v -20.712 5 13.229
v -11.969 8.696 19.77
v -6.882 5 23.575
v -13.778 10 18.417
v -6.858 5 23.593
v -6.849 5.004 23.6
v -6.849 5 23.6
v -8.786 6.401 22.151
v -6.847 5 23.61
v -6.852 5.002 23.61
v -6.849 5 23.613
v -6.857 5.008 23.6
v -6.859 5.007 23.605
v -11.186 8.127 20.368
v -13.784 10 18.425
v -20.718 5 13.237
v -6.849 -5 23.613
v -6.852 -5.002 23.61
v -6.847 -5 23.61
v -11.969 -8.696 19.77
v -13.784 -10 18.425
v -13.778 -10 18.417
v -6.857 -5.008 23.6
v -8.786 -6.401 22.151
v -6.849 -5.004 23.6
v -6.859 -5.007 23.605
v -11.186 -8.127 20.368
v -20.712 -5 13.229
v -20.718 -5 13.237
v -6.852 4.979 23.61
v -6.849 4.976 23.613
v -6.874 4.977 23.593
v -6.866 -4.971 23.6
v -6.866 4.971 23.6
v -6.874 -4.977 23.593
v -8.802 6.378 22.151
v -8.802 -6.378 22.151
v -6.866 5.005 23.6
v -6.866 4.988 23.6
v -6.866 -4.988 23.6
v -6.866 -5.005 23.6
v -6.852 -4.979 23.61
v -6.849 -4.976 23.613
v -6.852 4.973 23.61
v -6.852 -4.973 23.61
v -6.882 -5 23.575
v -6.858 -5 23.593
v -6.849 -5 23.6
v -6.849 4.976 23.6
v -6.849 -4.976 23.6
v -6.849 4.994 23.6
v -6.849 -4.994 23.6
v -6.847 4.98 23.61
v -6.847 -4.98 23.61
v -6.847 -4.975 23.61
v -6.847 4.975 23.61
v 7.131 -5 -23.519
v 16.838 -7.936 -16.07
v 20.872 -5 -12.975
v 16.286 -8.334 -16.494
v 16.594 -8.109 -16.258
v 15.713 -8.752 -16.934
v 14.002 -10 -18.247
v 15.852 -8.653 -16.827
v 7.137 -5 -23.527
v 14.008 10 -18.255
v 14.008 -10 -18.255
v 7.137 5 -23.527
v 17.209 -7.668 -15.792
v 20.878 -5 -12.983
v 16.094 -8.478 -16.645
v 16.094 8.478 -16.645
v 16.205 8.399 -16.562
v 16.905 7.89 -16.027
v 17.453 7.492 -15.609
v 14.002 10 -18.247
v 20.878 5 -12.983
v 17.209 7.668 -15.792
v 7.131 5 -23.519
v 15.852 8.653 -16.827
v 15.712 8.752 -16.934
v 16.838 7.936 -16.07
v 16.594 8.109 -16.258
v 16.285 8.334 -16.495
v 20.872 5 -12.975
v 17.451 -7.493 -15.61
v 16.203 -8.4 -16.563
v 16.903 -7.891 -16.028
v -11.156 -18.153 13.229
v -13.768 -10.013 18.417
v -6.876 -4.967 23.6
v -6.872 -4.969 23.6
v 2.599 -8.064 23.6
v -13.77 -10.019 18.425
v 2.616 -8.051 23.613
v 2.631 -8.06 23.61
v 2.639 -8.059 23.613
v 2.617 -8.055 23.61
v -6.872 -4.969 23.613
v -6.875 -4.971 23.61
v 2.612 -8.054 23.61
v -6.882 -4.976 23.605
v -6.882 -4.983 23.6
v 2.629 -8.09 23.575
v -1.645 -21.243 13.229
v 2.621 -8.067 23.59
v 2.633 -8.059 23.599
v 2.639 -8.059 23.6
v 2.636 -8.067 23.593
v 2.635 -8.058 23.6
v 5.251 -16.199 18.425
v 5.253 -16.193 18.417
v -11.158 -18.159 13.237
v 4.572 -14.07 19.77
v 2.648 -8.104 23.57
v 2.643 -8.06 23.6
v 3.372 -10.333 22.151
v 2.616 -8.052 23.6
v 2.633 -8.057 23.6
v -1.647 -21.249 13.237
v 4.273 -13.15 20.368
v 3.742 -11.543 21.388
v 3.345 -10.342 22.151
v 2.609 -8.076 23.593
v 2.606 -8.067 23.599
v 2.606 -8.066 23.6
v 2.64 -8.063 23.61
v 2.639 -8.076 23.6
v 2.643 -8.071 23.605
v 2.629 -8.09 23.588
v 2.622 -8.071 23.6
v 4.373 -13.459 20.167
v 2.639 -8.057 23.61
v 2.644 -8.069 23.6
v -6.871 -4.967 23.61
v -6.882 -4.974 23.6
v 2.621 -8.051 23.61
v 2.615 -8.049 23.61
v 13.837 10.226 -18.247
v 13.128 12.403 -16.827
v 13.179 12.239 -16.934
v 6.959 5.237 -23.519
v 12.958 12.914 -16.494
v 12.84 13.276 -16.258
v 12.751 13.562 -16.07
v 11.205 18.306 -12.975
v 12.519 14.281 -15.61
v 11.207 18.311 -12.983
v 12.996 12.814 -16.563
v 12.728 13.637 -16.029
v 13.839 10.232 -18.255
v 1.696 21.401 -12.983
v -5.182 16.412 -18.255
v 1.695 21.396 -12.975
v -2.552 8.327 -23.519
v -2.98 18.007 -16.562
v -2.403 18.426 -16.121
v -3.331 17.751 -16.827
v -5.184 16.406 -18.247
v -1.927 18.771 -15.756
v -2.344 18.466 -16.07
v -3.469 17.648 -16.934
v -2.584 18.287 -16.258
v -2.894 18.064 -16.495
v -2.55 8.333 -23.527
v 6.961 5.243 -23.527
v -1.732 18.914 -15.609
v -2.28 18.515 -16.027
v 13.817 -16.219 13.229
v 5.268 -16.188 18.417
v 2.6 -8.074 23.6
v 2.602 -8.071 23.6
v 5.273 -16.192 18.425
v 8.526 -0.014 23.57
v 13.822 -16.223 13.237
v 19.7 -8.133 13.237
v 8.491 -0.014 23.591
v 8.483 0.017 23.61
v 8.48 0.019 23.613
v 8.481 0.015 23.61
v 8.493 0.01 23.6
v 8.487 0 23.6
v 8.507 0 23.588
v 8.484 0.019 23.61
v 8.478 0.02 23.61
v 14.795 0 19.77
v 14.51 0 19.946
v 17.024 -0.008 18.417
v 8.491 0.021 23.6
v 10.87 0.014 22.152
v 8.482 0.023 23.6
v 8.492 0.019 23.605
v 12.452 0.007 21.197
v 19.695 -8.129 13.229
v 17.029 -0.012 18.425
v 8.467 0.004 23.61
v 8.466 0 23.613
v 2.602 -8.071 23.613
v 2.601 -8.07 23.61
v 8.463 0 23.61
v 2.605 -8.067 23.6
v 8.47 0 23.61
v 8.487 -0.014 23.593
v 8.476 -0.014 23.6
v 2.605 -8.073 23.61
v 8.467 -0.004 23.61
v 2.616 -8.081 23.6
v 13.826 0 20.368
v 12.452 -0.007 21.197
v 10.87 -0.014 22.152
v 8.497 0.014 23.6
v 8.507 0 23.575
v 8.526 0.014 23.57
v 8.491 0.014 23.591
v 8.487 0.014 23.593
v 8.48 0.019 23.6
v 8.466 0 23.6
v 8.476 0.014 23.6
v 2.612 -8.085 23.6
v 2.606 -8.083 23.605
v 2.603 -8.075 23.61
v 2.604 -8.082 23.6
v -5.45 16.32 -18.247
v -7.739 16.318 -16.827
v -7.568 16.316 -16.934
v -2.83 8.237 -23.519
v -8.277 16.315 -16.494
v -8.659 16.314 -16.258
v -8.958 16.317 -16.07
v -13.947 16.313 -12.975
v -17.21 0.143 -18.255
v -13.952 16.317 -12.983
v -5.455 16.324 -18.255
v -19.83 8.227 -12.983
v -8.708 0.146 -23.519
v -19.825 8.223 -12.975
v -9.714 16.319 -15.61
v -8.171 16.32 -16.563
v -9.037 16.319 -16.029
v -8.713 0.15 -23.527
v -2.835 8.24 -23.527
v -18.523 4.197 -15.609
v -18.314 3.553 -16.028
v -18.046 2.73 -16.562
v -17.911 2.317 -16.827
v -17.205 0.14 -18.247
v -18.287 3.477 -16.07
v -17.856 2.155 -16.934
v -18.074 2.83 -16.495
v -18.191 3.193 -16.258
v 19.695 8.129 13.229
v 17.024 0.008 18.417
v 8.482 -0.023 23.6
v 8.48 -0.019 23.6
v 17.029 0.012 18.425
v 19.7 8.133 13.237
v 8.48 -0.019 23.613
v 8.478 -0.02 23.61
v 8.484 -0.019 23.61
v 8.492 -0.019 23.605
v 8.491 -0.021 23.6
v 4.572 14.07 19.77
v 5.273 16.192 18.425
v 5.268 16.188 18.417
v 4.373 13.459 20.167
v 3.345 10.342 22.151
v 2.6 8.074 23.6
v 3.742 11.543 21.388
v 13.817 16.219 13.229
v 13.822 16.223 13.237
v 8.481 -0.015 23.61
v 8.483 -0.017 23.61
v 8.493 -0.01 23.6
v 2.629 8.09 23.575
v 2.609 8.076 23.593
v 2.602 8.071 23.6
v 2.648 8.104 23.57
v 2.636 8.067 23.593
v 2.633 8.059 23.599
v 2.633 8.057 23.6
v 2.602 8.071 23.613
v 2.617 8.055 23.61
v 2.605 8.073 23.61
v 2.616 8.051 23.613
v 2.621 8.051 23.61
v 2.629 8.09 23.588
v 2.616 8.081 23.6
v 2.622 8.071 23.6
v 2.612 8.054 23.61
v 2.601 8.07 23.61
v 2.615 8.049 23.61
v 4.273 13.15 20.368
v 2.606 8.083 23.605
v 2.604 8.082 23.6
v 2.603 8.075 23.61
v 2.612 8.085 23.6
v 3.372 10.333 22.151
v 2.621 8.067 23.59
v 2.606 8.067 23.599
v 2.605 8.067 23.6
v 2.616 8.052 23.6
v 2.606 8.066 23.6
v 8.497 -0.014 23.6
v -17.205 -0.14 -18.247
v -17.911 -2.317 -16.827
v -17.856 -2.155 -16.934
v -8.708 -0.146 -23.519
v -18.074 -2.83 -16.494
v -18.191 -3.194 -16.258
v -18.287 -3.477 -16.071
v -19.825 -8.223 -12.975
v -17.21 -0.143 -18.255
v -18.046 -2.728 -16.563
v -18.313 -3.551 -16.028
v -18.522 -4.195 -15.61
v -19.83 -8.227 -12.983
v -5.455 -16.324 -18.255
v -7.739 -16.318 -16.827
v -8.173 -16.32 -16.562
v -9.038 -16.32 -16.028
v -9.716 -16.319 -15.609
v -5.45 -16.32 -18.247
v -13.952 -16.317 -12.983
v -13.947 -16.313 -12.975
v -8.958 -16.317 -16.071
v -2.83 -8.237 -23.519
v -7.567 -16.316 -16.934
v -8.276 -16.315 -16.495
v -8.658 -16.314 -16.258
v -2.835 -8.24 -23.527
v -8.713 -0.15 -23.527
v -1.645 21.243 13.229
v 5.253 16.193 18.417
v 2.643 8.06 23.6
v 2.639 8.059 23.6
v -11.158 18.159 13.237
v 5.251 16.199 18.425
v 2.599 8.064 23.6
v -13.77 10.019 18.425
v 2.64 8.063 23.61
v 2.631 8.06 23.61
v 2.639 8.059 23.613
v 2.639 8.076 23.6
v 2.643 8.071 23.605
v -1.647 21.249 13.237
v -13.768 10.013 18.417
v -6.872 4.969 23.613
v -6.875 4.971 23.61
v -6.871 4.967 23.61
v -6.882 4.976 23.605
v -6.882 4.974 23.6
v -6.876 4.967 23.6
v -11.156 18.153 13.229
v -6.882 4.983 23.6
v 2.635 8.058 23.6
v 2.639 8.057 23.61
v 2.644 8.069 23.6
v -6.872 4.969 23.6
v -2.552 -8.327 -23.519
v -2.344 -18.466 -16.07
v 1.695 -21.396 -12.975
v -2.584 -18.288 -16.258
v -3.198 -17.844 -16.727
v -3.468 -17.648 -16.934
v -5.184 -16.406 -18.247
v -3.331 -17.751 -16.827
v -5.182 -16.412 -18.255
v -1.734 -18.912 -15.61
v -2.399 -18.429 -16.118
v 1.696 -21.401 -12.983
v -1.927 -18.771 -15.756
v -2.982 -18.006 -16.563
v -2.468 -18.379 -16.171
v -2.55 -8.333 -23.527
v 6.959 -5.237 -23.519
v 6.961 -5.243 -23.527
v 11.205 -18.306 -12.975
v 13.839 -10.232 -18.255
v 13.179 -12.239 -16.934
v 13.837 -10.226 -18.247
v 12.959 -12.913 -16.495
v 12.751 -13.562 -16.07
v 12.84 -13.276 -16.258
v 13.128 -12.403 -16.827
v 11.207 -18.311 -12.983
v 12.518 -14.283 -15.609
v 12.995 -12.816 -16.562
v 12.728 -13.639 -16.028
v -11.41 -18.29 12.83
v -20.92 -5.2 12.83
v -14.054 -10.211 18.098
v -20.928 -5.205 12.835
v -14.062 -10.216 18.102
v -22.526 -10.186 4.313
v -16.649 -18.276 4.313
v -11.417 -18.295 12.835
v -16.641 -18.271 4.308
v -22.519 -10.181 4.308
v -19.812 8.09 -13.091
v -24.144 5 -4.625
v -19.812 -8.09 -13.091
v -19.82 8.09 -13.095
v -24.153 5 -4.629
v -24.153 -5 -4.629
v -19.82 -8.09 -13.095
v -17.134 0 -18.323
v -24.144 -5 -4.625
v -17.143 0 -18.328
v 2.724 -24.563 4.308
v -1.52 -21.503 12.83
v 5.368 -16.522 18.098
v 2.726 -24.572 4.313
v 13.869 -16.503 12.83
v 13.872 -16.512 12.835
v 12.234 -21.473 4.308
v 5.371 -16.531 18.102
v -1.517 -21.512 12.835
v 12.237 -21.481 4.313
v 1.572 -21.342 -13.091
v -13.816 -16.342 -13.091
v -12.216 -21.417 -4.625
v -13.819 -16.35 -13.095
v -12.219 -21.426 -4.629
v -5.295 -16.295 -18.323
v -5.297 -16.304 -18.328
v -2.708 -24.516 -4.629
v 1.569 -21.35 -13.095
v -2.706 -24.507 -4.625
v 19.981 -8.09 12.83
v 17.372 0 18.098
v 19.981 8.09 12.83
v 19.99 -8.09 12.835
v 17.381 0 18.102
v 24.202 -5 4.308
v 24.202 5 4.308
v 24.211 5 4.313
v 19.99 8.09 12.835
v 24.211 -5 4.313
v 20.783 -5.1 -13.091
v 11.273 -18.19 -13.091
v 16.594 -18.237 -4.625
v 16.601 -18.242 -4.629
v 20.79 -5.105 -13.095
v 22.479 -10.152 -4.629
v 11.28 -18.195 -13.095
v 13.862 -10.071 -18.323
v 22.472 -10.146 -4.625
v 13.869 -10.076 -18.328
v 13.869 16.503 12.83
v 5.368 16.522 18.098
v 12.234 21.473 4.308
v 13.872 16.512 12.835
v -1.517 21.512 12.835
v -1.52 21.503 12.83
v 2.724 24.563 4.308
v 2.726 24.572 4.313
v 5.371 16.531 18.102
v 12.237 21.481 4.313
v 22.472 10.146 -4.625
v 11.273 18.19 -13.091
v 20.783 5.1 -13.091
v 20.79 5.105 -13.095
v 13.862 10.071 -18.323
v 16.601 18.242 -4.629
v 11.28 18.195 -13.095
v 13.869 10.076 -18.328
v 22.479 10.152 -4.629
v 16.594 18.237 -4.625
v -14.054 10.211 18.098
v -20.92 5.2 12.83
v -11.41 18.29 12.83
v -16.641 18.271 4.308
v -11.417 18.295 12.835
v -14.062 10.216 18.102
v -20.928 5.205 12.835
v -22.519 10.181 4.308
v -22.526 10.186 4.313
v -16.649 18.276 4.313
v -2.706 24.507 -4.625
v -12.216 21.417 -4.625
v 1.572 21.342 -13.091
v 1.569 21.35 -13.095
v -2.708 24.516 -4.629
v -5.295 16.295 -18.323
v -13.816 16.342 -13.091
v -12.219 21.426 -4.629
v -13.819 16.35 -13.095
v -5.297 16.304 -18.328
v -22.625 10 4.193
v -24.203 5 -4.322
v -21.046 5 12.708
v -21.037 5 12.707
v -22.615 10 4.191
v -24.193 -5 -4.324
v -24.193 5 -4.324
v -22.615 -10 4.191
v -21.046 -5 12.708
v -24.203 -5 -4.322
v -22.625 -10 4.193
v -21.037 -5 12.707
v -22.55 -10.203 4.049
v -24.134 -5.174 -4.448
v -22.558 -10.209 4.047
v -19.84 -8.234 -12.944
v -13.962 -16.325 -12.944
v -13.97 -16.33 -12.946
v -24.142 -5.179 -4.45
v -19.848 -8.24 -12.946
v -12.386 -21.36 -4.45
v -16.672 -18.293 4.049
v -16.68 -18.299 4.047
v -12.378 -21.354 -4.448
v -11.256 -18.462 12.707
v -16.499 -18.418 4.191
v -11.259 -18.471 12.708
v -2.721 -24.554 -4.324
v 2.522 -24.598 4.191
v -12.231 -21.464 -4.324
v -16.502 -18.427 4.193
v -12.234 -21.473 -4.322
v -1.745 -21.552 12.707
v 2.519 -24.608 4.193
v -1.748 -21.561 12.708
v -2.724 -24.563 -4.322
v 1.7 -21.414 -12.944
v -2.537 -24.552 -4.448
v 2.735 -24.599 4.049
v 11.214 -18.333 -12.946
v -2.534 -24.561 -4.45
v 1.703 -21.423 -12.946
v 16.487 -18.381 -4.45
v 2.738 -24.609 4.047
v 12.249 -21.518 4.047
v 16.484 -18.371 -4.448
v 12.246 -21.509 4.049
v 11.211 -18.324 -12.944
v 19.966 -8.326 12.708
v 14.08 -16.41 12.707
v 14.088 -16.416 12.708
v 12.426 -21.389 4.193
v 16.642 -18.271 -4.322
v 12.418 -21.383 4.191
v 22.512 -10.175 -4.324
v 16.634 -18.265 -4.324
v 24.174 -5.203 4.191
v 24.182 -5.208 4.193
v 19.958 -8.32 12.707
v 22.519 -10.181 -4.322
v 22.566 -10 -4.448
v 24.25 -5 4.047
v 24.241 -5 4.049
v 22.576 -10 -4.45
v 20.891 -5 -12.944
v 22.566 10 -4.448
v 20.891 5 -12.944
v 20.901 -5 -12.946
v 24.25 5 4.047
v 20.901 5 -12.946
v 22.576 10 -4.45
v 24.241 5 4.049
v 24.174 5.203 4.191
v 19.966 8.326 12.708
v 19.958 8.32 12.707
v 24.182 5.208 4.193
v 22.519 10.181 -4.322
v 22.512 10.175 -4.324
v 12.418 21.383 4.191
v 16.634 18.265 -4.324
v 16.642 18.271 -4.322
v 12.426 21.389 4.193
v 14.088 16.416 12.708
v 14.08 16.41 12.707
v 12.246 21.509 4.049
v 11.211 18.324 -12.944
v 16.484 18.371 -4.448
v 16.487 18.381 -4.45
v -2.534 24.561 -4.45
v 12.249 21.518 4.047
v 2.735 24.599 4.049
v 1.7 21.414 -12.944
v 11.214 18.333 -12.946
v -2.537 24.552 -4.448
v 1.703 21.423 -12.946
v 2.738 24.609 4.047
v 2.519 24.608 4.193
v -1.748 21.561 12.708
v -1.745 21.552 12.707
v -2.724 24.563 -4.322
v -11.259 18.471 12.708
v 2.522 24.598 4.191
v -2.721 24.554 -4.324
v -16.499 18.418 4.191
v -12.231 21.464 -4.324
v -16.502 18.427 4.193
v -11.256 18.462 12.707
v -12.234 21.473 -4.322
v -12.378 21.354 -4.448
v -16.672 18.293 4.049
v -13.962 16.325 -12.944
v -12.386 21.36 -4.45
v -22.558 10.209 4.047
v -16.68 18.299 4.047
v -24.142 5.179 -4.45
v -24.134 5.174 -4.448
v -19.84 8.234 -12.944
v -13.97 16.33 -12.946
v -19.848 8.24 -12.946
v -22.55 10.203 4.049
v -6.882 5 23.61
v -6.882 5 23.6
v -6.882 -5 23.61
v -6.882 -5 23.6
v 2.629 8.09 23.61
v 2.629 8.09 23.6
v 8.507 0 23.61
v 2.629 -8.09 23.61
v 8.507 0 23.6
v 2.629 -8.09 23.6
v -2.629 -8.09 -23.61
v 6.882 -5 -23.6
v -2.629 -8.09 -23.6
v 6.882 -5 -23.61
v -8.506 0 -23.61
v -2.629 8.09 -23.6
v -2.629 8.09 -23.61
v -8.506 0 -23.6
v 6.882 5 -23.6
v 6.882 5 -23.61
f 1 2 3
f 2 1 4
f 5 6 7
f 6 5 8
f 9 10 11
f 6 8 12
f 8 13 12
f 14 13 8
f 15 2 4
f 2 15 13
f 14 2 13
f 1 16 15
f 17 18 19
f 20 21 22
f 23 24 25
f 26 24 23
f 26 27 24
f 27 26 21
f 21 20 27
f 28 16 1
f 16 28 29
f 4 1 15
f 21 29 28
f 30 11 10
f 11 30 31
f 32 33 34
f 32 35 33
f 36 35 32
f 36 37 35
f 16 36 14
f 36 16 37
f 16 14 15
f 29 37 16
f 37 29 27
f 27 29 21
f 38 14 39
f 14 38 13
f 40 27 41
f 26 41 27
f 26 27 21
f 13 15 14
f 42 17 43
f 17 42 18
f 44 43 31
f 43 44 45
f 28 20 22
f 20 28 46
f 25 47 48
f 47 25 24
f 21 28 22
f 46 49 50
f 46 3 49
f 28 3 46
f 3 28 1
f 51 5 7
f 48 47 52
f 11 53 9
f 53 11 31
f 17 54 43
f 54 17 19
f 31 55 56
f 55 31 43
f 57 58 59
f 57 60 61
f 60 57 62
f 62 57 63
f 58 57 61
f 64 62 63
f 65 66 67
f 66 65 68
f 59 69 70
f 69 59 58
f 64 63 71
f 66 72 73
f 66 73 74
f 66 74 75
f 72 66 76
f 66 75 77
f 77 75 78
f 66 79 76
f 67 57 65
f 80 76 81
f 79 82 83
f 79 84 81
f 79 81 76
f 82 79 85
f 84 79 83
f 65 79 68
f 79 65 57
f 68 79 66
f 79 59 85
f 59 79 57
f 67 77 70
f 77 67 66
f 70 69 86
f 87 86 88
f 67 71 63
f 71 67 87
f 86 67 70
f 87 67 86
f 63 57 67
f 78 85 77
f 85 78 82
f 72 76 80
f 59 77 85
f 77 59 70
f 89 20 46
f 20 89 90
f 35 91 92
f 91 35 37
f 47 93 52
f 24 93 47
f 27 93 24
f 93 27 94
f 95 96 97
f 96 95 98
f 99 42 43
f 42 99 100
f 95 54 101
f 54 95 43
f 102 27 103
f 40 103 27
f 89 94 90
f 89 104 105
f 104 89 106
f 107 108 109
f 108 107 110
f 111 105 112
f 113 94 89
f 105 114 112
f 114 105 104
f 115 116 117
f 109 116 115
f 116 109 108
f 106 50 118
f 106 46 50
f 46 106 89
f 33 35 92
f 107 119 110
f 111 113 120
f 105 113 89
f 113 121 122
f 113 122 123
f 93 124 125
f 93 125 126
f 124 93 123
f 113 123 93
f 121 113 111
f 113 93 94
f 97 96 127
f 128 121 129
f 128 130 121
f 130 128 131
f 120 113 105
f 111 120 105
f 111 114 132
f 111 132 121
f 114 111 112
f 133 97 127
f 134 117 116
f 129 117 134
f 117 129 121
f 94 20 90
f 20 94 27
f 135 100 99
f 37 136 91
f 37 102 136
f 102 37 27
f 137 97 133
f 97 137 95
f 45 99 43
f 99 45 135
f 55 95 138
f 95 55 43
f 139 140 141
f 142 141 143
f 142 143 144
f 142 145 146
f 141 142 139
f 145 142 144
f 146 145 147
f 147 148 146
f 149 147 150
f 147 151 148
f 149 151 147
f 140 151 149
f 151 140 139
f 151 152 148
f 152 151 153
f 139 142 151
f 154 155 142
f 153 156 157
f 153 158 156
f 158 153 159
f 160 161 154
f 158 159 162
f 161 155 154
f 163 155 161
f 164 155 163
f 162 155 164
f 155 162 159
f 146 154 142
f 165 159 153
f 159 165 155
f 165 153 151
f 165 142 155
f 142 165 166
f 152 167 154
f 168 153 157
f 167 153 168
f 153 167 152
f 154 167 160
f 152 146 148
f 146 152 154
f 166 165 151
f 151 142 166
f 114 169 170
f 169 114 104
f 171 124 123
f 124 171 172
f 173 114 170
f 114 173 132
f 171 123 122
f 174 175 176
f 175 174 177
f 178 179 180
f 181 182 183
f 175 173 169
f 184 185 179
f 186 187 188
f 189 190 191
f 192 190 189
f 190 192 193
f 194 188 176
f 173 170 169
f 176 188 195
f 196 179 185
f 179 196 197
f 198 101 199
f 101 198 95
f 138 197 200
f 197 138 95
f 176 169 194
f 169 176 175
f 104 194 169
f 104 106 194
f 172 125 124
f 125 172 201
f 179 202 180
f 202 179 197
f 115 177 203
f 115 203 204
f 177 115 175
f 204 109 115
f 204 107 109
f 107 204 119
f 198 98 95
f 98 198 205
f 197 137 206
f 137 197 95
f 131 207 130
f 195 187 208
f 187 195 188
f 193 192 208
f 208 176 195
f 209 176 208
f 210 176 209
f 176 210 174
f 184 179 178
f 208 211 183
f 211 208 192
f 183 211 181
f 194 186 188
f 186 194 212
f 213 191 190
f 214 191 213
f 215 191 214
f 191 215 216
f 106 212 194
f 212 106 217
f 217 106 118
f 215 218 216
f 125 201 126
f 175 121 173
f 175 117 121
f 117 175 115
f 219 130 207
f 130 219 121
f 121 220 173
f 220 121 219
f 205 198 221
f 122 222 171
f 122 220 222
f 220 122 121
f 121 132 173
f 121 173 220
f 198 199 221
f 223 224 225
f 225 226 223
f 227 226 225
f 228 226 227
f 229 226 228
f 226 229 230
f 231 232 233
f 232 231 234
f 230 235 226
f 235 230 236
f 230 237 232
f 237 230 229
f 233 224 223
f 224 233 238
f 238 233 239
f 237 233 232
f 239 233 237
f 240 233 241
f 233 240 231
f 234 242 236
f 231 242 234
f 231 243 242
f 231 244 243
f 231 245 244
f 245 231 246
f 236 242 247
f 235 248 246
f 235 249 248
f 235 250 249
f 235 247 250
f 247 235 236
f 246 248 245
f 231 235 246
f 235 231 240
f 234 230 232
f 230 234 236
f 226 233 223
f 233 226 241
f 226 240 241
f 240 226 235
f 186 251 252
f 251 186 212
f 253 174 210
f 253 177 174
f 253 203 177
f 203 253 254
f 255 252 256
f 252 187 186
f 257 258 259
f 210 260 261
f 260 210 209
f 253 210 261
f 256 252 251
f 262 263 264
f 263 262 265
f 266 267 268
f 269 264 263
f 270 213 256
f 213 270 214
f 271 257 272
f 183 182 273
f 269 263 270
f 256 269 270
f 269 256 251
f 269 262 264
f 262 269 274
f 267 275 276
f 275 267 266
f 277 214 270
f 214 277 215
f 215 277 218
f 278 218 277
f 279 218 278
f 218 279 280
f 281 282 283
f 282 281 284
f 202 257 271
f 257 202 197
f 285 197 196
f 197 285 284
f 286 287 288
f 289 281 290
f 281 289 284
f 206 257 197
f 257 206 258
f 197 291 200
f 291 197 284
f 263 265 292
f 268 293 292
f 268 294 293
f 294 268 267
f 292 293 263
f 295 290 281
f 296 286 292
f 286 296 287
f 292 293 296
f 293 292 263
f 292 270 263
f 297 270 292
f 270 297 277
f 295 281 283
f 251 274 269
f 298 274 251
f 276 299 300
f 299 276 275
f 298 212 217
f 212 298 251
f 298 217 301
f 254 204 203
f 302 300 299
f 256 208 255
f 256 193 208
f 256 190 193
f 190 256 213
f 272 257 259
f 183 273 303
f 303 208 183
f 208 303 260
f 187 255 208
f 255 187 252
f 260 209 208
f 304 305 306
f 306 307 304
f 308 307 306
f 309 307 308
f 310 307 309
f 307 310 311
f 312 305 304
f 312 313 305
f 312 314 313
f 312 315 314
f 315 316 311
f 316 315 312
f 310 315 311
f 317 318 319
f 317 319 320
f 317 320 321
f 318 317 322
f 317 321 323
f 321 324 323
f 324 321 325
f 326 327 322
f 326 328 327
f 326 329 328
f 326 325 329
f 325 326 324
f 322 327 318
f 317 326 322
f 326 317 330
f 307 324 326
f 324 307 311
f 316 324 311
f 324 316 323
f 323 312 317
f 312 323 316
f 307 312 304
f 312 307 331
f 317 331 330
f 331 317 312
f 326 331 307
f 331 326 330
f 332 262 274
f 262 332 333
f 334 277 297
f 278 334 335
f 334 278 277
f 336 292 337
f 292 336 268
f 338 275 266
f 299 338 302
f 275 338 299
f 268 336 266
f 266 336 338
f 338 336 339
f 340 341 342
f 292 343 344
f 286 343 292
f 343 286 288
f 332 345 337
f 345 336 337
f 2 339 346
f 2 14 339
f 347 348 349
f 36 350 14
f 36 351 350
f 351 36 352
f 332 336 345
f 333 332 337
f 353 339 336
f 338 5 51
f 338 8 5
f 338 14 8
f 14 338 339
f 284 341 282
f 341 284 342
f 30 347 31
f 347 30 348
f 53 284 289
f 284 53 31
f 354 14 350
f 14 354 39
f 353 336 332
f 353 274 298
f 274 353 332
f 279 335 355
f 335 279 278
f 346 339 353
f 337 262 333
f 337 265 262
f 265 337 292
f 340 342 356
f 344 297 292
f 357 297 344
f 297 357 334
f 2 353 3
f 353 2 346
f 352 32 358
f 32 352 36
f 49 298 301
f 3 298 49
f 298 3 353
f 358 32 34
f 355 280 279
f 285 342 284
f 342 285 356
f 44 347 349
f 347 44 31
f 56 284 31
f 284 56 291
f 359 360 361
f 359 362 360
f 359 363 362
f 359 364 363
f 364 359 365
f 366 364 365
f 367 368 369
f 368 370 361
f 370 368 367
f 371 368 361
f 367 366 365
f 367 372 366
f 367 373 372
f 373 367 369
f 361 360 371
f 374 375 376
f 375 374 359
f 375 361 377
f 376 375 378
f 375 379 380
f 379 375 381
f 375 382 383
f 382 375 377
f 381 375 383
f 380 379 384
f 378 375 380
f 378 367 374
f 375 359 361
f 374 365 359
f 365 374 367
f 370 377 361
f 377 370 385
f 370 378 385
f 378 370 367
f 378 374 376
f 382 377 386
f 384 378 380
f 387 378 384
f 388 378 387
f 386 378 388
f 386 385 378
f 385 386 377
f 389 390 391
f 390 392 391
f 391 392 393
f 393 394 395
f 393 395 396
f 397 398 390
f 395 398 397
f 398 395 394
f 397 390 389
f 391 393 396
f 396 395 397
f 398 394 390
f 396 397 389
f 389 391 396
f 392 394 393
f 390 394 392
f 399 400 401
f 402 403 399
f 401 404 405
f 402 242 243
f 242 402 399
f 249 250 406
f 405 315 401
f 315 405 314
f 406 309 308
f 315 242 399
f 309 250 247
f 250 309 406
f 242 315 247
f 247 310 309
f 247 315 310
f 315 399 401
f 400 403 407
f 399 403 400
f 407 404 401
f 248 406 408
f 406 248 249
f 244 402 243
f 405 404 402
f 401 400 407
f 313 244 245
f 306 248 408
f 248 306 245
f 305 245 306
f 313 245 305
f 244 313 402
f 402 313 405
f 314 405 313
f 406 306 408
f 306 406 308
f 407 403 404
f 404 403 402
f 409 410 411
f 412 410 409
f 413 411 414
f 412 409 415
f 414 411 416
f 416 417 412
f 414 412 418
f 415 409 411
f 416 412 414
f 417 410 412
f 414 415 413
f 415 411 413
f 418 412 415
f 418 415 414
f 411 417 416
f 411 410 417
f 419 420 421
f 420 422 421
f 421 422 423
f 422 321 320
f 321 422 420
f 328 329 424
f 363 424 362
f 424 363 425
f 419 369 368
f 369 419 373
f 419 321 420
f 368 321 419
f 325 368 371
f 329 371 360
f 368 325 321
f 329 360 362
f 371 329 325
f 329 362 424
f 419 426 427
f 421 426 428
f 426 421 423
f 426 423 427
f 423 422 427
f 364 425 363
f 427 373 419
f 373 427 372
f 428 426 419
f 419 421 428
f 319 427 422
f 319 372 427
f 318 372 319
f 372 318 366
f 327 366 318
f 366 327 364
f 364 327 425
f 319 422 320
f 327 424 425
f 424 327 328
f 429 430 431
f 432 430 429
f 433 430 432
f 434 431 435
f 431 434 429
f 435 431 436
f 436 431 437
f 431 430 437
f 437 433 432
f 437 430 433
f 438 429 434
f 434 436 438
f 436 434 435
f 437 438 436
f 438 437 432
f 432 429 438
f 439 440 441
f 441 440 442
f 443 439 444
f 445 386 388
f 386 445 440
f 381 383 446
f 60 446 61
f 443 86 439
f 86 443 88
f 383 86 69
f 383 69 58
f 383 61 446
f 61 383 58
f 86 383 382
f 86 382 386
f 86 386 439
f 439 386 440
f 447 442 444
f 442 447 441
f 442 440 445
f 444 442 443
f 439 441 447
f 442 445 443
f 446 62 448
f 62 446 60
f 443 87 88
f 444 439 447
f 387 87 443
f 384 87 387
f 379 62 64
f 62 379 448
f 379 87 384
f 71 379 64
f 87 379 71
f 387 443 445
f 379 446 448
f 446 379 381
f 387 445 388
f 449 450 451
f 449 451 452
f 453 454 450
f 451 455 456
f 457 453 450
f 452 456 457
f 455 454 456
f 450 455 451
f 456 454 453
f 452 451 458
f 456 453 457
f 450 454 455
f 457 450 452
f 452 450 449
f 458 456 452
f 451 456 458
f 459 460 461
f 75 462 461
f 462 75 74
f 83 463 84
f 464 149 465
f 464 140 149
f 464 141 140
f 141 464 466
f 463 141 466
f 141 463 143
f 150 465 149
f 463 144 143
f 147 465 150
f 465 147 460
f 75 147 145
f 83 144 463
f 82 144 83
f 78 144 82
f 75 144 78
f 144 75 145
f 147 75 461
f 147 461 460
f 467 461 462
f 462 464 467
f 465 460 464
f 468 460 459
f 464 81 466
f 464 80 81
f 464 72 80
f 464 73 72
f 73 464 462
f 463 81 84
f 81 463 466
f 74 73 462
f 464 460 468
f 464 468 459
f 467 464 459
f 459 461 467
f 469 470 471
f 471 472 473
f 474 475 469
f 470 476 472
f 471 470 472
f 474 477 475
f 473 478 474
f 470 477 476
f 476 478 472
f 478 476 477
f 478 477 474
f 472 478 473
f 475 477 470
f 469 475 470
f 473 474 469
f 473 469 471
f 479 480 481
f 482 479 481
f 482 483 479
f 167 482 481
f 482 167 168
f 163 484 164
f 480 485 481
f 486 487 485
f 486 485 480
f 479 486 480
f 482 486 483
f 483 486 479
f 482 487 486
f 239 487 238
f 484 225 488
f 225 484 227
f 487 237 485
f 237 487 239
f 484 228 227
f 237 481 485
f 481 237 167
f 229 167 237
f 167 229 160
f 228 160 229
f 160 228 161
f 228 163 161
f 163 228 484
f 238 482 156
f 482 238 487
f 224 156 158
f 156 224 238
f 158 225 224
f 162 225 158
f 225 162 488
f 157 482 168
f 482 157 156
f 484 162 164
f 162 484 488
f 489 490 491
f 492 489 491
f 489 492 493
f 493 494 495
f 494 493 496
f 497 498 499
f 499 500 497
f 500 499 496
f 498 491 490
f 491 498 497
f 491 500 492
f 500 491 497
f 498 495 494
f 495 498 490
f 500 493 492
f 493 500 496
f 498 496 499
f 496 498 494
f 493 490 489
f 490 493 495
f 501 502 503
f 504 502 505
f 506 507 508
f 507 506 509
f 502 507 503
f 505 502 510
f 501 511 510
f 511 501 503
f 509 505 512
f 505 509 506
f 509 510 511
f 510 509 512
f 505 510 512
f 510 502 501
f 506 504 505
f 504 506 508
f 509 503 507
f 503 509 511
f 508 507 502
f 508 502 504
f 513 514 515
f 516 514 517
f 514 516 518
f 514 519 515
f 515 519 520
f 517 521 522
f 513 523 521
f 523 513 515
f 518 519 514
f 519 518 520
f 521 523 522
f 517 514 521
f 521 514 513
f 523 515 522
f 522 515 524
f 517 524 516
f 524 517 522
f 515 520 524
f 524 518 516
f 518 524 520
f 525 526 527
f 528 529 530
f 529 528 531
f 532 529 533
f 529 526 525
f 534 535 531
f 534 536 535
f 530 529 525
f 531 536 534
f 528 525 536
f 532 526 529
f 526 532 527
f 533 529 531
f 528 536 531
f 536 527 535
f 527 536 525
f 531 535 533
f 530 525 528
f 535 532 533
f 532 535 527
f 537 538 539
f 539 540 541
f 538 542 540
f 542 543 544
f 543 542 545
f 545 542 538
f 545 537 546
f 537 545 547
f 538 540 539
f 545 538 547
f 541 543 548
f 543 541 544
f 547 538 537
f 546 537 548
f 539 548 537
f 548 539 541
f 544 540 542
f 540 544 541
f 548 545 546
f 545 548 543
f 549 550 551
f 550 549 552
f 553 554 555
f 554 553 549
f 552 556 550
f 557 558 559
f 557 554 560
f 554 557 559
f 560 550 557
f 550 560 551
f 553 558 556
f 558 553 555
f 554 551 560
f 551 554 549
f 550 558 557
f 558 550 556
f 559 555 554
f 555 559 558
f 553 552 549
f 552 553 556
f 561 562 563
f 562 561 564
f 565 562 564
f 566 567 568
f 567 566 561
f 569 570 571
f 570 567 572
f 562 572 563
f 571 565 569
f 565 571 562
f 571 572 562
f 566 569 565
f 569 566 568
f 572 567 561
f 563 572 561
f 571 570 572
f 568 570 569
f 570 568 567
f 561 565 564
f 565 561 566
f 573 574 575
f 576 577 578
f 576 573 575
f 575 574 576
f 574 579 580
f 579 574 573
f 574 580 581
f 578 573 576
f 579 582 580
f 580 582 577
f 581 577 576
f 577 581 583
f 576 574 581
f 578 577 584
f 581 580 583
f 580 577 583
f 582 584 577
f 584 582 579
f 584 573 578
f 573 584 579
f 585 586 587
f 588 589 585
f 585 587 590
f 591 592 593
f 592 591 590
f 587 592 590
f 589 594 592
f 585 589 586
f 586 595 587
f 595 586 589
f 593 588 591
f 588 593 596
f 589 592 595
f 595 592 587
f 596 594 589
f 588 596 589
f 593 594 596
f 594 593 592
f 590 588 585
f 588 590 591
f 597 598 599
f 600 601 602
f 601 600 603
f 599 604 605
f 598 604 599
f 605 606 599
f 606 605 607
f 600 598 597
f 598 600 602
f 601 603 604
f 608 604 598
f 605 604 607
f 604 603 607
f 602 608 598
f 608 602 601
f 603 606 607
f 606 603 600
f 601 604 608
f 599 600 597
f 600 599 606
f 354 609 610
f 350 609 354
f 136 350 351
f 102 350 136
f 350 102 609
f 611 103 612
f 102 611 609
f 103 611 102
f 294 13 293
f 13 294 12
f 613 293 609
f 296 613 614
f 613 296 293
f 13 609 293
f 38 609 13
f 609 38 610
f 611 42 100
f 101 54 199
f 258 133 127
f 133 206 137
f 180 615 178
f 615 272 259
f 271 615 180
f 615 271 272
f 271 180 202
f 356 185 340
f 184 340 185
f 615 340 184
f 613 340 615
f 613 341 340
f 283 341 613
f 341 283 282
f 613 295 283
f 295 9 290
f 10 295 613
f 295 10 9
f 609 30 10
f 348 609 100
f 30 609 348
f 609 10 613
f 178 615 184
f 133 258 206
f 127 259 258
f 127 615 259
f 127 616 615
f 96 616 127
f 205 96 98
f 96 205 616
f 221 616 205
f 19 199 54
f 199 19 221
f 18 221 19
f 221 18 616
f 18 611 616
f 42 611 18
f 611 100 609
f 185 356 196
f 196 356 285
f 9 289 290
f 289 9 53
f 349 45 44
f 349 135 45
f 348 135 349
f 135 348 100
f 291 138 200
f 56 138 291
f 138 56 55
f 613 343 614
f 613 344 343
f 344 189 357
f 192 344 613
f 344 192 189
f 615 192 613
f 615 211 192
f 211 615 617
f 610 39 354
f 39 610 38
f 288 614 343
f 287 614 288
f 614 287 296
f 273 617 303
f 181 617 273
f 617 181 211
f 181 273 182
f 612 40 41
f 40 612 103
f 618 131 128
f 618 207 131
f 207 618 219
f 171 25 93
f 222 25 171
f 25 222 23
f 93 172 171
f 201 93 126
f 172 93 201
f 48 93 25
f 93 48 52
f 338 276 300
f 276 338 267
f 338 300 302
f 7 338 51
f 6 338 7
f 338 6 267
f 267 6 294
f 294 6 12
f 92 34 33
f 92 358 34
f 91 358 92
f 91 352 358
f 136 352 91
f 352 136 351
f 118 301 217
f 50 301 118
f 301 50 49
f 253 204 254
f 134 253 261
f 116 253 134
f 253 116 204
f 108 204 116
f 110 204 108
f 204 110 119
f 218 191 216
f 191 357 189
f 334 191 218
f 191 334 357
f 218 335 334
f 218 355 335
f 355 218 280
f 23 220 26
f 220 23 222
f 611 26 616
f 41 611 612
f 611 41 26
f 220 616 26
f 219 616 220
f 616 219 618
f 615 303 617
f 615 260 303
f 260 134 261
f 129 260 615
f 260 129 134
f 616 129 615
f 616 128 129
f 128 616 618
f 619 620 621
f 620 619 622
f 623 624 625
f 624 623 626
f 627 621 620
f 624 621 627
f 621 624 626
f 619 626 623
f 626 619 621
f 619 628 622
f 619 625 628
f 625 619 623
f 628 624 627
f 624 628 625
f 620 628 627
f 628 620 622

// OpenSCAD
// params to tweak
thick=.01;
side = 10;
shell_thick = 2;
shell_dr = 4;


// empirical constants (would be great to have exact formulas)
coeff_side_r = 2.3; //2.24   // ratio between polygon side and final radius
coeff_pent_delta_side = 0.06;

// derived values
pent_a = 180 / 5;
hex_a = 180 / 6;
pent_r = side / (2*sin(pent_a));
hex_r = side / (2*sin(hex_a));

radius = side * coeff_side_r;
pent_delta = side * coeff_pent_delta_side;

// https://math.stackexchange.com/questions/2029958/numbering-a-spherical-grid-of-pentagons-and-hexagons-so-neighbours-are-easily

// https://www.americanscientist.org/article/the-topology-and-combinatorics-of-soccer-balls#:~:text=Twelve%20pentagons%20and%2020%20hexagons,as%20the%20standard%20soccer%20ball.


module hex_tile(side = side, thick=thick, tile_a=0) {
    angles = [for (i = [0:5]) 30 + i*(2*hex_a)];
    coords = [for (th=angles) [hex_r * cos(th), hex_r * sin(th)]];
    rotate([0, 0, tile_a])
    linear_extrude(thick)
        polygon(coords);
}


module pent_tile(side = side, thick=thick, tile_a=0) {
    angles = [for (i = [0:4]) i*(2*pent_a)];
    coords = [for (th=angles) [pent_r * cos(th), pent_r * sin(th)]];
    color("lightblue")
    rotate([0, 0, tile_a])
    linear_extrude(thick)
        polygon(coords);
}


module ball() {
    // center
    translate([0, 0, radius+pent_delta])
        pent_tile();
    mirror([0, 0, 1])
    translate([0, 0, radius+pent_delta])
        pent_tile(tile_a=pent_a);

    // layer 1
    for (i = [0:4]) {
        rotate([0, -36.8, i*pent_a*2])
        translate([0, 0, radius])
            hex_tile();
        rotate([180, -37.5, i*pent_a*2])
        translate([0, 0, radius])
            hex_tile();
    }    

    // center 2
    for (i = [1:2:9]) {
        rotate([0, -37.5*2+11.35, i*pent_a])
        translate([0, 0, radius+pent_delta])
            pent_tile();
        rotate([0, -37.2*3-5.5, (i-1)*pent_a])
        translate([0, 0, radius+pent_delta])
            pent_tile(tile_a=pent_a);

    }

    // layer 2
    for (i = [1:2:9]) {
        rotate([0, -37.5*2-4.5, pent_a*(i-1)])
        translate([0, 0, radius])
            hex_tile();
        rotate([0, -37.5*3+11.35, pent_a*i])
        translate([0, 0, radius])
            hex_tile();
    }
}


module shell(dr=shell_dr) {
    difference() {
        sphere(radius + dr, $fn=100);
        sphere(radius + dr - shell_thick, $fn=100);
    }
}


module diff_shell() {
    difference() {
        shell();
        ball();
    }
}


ball();
//diff_shell();
